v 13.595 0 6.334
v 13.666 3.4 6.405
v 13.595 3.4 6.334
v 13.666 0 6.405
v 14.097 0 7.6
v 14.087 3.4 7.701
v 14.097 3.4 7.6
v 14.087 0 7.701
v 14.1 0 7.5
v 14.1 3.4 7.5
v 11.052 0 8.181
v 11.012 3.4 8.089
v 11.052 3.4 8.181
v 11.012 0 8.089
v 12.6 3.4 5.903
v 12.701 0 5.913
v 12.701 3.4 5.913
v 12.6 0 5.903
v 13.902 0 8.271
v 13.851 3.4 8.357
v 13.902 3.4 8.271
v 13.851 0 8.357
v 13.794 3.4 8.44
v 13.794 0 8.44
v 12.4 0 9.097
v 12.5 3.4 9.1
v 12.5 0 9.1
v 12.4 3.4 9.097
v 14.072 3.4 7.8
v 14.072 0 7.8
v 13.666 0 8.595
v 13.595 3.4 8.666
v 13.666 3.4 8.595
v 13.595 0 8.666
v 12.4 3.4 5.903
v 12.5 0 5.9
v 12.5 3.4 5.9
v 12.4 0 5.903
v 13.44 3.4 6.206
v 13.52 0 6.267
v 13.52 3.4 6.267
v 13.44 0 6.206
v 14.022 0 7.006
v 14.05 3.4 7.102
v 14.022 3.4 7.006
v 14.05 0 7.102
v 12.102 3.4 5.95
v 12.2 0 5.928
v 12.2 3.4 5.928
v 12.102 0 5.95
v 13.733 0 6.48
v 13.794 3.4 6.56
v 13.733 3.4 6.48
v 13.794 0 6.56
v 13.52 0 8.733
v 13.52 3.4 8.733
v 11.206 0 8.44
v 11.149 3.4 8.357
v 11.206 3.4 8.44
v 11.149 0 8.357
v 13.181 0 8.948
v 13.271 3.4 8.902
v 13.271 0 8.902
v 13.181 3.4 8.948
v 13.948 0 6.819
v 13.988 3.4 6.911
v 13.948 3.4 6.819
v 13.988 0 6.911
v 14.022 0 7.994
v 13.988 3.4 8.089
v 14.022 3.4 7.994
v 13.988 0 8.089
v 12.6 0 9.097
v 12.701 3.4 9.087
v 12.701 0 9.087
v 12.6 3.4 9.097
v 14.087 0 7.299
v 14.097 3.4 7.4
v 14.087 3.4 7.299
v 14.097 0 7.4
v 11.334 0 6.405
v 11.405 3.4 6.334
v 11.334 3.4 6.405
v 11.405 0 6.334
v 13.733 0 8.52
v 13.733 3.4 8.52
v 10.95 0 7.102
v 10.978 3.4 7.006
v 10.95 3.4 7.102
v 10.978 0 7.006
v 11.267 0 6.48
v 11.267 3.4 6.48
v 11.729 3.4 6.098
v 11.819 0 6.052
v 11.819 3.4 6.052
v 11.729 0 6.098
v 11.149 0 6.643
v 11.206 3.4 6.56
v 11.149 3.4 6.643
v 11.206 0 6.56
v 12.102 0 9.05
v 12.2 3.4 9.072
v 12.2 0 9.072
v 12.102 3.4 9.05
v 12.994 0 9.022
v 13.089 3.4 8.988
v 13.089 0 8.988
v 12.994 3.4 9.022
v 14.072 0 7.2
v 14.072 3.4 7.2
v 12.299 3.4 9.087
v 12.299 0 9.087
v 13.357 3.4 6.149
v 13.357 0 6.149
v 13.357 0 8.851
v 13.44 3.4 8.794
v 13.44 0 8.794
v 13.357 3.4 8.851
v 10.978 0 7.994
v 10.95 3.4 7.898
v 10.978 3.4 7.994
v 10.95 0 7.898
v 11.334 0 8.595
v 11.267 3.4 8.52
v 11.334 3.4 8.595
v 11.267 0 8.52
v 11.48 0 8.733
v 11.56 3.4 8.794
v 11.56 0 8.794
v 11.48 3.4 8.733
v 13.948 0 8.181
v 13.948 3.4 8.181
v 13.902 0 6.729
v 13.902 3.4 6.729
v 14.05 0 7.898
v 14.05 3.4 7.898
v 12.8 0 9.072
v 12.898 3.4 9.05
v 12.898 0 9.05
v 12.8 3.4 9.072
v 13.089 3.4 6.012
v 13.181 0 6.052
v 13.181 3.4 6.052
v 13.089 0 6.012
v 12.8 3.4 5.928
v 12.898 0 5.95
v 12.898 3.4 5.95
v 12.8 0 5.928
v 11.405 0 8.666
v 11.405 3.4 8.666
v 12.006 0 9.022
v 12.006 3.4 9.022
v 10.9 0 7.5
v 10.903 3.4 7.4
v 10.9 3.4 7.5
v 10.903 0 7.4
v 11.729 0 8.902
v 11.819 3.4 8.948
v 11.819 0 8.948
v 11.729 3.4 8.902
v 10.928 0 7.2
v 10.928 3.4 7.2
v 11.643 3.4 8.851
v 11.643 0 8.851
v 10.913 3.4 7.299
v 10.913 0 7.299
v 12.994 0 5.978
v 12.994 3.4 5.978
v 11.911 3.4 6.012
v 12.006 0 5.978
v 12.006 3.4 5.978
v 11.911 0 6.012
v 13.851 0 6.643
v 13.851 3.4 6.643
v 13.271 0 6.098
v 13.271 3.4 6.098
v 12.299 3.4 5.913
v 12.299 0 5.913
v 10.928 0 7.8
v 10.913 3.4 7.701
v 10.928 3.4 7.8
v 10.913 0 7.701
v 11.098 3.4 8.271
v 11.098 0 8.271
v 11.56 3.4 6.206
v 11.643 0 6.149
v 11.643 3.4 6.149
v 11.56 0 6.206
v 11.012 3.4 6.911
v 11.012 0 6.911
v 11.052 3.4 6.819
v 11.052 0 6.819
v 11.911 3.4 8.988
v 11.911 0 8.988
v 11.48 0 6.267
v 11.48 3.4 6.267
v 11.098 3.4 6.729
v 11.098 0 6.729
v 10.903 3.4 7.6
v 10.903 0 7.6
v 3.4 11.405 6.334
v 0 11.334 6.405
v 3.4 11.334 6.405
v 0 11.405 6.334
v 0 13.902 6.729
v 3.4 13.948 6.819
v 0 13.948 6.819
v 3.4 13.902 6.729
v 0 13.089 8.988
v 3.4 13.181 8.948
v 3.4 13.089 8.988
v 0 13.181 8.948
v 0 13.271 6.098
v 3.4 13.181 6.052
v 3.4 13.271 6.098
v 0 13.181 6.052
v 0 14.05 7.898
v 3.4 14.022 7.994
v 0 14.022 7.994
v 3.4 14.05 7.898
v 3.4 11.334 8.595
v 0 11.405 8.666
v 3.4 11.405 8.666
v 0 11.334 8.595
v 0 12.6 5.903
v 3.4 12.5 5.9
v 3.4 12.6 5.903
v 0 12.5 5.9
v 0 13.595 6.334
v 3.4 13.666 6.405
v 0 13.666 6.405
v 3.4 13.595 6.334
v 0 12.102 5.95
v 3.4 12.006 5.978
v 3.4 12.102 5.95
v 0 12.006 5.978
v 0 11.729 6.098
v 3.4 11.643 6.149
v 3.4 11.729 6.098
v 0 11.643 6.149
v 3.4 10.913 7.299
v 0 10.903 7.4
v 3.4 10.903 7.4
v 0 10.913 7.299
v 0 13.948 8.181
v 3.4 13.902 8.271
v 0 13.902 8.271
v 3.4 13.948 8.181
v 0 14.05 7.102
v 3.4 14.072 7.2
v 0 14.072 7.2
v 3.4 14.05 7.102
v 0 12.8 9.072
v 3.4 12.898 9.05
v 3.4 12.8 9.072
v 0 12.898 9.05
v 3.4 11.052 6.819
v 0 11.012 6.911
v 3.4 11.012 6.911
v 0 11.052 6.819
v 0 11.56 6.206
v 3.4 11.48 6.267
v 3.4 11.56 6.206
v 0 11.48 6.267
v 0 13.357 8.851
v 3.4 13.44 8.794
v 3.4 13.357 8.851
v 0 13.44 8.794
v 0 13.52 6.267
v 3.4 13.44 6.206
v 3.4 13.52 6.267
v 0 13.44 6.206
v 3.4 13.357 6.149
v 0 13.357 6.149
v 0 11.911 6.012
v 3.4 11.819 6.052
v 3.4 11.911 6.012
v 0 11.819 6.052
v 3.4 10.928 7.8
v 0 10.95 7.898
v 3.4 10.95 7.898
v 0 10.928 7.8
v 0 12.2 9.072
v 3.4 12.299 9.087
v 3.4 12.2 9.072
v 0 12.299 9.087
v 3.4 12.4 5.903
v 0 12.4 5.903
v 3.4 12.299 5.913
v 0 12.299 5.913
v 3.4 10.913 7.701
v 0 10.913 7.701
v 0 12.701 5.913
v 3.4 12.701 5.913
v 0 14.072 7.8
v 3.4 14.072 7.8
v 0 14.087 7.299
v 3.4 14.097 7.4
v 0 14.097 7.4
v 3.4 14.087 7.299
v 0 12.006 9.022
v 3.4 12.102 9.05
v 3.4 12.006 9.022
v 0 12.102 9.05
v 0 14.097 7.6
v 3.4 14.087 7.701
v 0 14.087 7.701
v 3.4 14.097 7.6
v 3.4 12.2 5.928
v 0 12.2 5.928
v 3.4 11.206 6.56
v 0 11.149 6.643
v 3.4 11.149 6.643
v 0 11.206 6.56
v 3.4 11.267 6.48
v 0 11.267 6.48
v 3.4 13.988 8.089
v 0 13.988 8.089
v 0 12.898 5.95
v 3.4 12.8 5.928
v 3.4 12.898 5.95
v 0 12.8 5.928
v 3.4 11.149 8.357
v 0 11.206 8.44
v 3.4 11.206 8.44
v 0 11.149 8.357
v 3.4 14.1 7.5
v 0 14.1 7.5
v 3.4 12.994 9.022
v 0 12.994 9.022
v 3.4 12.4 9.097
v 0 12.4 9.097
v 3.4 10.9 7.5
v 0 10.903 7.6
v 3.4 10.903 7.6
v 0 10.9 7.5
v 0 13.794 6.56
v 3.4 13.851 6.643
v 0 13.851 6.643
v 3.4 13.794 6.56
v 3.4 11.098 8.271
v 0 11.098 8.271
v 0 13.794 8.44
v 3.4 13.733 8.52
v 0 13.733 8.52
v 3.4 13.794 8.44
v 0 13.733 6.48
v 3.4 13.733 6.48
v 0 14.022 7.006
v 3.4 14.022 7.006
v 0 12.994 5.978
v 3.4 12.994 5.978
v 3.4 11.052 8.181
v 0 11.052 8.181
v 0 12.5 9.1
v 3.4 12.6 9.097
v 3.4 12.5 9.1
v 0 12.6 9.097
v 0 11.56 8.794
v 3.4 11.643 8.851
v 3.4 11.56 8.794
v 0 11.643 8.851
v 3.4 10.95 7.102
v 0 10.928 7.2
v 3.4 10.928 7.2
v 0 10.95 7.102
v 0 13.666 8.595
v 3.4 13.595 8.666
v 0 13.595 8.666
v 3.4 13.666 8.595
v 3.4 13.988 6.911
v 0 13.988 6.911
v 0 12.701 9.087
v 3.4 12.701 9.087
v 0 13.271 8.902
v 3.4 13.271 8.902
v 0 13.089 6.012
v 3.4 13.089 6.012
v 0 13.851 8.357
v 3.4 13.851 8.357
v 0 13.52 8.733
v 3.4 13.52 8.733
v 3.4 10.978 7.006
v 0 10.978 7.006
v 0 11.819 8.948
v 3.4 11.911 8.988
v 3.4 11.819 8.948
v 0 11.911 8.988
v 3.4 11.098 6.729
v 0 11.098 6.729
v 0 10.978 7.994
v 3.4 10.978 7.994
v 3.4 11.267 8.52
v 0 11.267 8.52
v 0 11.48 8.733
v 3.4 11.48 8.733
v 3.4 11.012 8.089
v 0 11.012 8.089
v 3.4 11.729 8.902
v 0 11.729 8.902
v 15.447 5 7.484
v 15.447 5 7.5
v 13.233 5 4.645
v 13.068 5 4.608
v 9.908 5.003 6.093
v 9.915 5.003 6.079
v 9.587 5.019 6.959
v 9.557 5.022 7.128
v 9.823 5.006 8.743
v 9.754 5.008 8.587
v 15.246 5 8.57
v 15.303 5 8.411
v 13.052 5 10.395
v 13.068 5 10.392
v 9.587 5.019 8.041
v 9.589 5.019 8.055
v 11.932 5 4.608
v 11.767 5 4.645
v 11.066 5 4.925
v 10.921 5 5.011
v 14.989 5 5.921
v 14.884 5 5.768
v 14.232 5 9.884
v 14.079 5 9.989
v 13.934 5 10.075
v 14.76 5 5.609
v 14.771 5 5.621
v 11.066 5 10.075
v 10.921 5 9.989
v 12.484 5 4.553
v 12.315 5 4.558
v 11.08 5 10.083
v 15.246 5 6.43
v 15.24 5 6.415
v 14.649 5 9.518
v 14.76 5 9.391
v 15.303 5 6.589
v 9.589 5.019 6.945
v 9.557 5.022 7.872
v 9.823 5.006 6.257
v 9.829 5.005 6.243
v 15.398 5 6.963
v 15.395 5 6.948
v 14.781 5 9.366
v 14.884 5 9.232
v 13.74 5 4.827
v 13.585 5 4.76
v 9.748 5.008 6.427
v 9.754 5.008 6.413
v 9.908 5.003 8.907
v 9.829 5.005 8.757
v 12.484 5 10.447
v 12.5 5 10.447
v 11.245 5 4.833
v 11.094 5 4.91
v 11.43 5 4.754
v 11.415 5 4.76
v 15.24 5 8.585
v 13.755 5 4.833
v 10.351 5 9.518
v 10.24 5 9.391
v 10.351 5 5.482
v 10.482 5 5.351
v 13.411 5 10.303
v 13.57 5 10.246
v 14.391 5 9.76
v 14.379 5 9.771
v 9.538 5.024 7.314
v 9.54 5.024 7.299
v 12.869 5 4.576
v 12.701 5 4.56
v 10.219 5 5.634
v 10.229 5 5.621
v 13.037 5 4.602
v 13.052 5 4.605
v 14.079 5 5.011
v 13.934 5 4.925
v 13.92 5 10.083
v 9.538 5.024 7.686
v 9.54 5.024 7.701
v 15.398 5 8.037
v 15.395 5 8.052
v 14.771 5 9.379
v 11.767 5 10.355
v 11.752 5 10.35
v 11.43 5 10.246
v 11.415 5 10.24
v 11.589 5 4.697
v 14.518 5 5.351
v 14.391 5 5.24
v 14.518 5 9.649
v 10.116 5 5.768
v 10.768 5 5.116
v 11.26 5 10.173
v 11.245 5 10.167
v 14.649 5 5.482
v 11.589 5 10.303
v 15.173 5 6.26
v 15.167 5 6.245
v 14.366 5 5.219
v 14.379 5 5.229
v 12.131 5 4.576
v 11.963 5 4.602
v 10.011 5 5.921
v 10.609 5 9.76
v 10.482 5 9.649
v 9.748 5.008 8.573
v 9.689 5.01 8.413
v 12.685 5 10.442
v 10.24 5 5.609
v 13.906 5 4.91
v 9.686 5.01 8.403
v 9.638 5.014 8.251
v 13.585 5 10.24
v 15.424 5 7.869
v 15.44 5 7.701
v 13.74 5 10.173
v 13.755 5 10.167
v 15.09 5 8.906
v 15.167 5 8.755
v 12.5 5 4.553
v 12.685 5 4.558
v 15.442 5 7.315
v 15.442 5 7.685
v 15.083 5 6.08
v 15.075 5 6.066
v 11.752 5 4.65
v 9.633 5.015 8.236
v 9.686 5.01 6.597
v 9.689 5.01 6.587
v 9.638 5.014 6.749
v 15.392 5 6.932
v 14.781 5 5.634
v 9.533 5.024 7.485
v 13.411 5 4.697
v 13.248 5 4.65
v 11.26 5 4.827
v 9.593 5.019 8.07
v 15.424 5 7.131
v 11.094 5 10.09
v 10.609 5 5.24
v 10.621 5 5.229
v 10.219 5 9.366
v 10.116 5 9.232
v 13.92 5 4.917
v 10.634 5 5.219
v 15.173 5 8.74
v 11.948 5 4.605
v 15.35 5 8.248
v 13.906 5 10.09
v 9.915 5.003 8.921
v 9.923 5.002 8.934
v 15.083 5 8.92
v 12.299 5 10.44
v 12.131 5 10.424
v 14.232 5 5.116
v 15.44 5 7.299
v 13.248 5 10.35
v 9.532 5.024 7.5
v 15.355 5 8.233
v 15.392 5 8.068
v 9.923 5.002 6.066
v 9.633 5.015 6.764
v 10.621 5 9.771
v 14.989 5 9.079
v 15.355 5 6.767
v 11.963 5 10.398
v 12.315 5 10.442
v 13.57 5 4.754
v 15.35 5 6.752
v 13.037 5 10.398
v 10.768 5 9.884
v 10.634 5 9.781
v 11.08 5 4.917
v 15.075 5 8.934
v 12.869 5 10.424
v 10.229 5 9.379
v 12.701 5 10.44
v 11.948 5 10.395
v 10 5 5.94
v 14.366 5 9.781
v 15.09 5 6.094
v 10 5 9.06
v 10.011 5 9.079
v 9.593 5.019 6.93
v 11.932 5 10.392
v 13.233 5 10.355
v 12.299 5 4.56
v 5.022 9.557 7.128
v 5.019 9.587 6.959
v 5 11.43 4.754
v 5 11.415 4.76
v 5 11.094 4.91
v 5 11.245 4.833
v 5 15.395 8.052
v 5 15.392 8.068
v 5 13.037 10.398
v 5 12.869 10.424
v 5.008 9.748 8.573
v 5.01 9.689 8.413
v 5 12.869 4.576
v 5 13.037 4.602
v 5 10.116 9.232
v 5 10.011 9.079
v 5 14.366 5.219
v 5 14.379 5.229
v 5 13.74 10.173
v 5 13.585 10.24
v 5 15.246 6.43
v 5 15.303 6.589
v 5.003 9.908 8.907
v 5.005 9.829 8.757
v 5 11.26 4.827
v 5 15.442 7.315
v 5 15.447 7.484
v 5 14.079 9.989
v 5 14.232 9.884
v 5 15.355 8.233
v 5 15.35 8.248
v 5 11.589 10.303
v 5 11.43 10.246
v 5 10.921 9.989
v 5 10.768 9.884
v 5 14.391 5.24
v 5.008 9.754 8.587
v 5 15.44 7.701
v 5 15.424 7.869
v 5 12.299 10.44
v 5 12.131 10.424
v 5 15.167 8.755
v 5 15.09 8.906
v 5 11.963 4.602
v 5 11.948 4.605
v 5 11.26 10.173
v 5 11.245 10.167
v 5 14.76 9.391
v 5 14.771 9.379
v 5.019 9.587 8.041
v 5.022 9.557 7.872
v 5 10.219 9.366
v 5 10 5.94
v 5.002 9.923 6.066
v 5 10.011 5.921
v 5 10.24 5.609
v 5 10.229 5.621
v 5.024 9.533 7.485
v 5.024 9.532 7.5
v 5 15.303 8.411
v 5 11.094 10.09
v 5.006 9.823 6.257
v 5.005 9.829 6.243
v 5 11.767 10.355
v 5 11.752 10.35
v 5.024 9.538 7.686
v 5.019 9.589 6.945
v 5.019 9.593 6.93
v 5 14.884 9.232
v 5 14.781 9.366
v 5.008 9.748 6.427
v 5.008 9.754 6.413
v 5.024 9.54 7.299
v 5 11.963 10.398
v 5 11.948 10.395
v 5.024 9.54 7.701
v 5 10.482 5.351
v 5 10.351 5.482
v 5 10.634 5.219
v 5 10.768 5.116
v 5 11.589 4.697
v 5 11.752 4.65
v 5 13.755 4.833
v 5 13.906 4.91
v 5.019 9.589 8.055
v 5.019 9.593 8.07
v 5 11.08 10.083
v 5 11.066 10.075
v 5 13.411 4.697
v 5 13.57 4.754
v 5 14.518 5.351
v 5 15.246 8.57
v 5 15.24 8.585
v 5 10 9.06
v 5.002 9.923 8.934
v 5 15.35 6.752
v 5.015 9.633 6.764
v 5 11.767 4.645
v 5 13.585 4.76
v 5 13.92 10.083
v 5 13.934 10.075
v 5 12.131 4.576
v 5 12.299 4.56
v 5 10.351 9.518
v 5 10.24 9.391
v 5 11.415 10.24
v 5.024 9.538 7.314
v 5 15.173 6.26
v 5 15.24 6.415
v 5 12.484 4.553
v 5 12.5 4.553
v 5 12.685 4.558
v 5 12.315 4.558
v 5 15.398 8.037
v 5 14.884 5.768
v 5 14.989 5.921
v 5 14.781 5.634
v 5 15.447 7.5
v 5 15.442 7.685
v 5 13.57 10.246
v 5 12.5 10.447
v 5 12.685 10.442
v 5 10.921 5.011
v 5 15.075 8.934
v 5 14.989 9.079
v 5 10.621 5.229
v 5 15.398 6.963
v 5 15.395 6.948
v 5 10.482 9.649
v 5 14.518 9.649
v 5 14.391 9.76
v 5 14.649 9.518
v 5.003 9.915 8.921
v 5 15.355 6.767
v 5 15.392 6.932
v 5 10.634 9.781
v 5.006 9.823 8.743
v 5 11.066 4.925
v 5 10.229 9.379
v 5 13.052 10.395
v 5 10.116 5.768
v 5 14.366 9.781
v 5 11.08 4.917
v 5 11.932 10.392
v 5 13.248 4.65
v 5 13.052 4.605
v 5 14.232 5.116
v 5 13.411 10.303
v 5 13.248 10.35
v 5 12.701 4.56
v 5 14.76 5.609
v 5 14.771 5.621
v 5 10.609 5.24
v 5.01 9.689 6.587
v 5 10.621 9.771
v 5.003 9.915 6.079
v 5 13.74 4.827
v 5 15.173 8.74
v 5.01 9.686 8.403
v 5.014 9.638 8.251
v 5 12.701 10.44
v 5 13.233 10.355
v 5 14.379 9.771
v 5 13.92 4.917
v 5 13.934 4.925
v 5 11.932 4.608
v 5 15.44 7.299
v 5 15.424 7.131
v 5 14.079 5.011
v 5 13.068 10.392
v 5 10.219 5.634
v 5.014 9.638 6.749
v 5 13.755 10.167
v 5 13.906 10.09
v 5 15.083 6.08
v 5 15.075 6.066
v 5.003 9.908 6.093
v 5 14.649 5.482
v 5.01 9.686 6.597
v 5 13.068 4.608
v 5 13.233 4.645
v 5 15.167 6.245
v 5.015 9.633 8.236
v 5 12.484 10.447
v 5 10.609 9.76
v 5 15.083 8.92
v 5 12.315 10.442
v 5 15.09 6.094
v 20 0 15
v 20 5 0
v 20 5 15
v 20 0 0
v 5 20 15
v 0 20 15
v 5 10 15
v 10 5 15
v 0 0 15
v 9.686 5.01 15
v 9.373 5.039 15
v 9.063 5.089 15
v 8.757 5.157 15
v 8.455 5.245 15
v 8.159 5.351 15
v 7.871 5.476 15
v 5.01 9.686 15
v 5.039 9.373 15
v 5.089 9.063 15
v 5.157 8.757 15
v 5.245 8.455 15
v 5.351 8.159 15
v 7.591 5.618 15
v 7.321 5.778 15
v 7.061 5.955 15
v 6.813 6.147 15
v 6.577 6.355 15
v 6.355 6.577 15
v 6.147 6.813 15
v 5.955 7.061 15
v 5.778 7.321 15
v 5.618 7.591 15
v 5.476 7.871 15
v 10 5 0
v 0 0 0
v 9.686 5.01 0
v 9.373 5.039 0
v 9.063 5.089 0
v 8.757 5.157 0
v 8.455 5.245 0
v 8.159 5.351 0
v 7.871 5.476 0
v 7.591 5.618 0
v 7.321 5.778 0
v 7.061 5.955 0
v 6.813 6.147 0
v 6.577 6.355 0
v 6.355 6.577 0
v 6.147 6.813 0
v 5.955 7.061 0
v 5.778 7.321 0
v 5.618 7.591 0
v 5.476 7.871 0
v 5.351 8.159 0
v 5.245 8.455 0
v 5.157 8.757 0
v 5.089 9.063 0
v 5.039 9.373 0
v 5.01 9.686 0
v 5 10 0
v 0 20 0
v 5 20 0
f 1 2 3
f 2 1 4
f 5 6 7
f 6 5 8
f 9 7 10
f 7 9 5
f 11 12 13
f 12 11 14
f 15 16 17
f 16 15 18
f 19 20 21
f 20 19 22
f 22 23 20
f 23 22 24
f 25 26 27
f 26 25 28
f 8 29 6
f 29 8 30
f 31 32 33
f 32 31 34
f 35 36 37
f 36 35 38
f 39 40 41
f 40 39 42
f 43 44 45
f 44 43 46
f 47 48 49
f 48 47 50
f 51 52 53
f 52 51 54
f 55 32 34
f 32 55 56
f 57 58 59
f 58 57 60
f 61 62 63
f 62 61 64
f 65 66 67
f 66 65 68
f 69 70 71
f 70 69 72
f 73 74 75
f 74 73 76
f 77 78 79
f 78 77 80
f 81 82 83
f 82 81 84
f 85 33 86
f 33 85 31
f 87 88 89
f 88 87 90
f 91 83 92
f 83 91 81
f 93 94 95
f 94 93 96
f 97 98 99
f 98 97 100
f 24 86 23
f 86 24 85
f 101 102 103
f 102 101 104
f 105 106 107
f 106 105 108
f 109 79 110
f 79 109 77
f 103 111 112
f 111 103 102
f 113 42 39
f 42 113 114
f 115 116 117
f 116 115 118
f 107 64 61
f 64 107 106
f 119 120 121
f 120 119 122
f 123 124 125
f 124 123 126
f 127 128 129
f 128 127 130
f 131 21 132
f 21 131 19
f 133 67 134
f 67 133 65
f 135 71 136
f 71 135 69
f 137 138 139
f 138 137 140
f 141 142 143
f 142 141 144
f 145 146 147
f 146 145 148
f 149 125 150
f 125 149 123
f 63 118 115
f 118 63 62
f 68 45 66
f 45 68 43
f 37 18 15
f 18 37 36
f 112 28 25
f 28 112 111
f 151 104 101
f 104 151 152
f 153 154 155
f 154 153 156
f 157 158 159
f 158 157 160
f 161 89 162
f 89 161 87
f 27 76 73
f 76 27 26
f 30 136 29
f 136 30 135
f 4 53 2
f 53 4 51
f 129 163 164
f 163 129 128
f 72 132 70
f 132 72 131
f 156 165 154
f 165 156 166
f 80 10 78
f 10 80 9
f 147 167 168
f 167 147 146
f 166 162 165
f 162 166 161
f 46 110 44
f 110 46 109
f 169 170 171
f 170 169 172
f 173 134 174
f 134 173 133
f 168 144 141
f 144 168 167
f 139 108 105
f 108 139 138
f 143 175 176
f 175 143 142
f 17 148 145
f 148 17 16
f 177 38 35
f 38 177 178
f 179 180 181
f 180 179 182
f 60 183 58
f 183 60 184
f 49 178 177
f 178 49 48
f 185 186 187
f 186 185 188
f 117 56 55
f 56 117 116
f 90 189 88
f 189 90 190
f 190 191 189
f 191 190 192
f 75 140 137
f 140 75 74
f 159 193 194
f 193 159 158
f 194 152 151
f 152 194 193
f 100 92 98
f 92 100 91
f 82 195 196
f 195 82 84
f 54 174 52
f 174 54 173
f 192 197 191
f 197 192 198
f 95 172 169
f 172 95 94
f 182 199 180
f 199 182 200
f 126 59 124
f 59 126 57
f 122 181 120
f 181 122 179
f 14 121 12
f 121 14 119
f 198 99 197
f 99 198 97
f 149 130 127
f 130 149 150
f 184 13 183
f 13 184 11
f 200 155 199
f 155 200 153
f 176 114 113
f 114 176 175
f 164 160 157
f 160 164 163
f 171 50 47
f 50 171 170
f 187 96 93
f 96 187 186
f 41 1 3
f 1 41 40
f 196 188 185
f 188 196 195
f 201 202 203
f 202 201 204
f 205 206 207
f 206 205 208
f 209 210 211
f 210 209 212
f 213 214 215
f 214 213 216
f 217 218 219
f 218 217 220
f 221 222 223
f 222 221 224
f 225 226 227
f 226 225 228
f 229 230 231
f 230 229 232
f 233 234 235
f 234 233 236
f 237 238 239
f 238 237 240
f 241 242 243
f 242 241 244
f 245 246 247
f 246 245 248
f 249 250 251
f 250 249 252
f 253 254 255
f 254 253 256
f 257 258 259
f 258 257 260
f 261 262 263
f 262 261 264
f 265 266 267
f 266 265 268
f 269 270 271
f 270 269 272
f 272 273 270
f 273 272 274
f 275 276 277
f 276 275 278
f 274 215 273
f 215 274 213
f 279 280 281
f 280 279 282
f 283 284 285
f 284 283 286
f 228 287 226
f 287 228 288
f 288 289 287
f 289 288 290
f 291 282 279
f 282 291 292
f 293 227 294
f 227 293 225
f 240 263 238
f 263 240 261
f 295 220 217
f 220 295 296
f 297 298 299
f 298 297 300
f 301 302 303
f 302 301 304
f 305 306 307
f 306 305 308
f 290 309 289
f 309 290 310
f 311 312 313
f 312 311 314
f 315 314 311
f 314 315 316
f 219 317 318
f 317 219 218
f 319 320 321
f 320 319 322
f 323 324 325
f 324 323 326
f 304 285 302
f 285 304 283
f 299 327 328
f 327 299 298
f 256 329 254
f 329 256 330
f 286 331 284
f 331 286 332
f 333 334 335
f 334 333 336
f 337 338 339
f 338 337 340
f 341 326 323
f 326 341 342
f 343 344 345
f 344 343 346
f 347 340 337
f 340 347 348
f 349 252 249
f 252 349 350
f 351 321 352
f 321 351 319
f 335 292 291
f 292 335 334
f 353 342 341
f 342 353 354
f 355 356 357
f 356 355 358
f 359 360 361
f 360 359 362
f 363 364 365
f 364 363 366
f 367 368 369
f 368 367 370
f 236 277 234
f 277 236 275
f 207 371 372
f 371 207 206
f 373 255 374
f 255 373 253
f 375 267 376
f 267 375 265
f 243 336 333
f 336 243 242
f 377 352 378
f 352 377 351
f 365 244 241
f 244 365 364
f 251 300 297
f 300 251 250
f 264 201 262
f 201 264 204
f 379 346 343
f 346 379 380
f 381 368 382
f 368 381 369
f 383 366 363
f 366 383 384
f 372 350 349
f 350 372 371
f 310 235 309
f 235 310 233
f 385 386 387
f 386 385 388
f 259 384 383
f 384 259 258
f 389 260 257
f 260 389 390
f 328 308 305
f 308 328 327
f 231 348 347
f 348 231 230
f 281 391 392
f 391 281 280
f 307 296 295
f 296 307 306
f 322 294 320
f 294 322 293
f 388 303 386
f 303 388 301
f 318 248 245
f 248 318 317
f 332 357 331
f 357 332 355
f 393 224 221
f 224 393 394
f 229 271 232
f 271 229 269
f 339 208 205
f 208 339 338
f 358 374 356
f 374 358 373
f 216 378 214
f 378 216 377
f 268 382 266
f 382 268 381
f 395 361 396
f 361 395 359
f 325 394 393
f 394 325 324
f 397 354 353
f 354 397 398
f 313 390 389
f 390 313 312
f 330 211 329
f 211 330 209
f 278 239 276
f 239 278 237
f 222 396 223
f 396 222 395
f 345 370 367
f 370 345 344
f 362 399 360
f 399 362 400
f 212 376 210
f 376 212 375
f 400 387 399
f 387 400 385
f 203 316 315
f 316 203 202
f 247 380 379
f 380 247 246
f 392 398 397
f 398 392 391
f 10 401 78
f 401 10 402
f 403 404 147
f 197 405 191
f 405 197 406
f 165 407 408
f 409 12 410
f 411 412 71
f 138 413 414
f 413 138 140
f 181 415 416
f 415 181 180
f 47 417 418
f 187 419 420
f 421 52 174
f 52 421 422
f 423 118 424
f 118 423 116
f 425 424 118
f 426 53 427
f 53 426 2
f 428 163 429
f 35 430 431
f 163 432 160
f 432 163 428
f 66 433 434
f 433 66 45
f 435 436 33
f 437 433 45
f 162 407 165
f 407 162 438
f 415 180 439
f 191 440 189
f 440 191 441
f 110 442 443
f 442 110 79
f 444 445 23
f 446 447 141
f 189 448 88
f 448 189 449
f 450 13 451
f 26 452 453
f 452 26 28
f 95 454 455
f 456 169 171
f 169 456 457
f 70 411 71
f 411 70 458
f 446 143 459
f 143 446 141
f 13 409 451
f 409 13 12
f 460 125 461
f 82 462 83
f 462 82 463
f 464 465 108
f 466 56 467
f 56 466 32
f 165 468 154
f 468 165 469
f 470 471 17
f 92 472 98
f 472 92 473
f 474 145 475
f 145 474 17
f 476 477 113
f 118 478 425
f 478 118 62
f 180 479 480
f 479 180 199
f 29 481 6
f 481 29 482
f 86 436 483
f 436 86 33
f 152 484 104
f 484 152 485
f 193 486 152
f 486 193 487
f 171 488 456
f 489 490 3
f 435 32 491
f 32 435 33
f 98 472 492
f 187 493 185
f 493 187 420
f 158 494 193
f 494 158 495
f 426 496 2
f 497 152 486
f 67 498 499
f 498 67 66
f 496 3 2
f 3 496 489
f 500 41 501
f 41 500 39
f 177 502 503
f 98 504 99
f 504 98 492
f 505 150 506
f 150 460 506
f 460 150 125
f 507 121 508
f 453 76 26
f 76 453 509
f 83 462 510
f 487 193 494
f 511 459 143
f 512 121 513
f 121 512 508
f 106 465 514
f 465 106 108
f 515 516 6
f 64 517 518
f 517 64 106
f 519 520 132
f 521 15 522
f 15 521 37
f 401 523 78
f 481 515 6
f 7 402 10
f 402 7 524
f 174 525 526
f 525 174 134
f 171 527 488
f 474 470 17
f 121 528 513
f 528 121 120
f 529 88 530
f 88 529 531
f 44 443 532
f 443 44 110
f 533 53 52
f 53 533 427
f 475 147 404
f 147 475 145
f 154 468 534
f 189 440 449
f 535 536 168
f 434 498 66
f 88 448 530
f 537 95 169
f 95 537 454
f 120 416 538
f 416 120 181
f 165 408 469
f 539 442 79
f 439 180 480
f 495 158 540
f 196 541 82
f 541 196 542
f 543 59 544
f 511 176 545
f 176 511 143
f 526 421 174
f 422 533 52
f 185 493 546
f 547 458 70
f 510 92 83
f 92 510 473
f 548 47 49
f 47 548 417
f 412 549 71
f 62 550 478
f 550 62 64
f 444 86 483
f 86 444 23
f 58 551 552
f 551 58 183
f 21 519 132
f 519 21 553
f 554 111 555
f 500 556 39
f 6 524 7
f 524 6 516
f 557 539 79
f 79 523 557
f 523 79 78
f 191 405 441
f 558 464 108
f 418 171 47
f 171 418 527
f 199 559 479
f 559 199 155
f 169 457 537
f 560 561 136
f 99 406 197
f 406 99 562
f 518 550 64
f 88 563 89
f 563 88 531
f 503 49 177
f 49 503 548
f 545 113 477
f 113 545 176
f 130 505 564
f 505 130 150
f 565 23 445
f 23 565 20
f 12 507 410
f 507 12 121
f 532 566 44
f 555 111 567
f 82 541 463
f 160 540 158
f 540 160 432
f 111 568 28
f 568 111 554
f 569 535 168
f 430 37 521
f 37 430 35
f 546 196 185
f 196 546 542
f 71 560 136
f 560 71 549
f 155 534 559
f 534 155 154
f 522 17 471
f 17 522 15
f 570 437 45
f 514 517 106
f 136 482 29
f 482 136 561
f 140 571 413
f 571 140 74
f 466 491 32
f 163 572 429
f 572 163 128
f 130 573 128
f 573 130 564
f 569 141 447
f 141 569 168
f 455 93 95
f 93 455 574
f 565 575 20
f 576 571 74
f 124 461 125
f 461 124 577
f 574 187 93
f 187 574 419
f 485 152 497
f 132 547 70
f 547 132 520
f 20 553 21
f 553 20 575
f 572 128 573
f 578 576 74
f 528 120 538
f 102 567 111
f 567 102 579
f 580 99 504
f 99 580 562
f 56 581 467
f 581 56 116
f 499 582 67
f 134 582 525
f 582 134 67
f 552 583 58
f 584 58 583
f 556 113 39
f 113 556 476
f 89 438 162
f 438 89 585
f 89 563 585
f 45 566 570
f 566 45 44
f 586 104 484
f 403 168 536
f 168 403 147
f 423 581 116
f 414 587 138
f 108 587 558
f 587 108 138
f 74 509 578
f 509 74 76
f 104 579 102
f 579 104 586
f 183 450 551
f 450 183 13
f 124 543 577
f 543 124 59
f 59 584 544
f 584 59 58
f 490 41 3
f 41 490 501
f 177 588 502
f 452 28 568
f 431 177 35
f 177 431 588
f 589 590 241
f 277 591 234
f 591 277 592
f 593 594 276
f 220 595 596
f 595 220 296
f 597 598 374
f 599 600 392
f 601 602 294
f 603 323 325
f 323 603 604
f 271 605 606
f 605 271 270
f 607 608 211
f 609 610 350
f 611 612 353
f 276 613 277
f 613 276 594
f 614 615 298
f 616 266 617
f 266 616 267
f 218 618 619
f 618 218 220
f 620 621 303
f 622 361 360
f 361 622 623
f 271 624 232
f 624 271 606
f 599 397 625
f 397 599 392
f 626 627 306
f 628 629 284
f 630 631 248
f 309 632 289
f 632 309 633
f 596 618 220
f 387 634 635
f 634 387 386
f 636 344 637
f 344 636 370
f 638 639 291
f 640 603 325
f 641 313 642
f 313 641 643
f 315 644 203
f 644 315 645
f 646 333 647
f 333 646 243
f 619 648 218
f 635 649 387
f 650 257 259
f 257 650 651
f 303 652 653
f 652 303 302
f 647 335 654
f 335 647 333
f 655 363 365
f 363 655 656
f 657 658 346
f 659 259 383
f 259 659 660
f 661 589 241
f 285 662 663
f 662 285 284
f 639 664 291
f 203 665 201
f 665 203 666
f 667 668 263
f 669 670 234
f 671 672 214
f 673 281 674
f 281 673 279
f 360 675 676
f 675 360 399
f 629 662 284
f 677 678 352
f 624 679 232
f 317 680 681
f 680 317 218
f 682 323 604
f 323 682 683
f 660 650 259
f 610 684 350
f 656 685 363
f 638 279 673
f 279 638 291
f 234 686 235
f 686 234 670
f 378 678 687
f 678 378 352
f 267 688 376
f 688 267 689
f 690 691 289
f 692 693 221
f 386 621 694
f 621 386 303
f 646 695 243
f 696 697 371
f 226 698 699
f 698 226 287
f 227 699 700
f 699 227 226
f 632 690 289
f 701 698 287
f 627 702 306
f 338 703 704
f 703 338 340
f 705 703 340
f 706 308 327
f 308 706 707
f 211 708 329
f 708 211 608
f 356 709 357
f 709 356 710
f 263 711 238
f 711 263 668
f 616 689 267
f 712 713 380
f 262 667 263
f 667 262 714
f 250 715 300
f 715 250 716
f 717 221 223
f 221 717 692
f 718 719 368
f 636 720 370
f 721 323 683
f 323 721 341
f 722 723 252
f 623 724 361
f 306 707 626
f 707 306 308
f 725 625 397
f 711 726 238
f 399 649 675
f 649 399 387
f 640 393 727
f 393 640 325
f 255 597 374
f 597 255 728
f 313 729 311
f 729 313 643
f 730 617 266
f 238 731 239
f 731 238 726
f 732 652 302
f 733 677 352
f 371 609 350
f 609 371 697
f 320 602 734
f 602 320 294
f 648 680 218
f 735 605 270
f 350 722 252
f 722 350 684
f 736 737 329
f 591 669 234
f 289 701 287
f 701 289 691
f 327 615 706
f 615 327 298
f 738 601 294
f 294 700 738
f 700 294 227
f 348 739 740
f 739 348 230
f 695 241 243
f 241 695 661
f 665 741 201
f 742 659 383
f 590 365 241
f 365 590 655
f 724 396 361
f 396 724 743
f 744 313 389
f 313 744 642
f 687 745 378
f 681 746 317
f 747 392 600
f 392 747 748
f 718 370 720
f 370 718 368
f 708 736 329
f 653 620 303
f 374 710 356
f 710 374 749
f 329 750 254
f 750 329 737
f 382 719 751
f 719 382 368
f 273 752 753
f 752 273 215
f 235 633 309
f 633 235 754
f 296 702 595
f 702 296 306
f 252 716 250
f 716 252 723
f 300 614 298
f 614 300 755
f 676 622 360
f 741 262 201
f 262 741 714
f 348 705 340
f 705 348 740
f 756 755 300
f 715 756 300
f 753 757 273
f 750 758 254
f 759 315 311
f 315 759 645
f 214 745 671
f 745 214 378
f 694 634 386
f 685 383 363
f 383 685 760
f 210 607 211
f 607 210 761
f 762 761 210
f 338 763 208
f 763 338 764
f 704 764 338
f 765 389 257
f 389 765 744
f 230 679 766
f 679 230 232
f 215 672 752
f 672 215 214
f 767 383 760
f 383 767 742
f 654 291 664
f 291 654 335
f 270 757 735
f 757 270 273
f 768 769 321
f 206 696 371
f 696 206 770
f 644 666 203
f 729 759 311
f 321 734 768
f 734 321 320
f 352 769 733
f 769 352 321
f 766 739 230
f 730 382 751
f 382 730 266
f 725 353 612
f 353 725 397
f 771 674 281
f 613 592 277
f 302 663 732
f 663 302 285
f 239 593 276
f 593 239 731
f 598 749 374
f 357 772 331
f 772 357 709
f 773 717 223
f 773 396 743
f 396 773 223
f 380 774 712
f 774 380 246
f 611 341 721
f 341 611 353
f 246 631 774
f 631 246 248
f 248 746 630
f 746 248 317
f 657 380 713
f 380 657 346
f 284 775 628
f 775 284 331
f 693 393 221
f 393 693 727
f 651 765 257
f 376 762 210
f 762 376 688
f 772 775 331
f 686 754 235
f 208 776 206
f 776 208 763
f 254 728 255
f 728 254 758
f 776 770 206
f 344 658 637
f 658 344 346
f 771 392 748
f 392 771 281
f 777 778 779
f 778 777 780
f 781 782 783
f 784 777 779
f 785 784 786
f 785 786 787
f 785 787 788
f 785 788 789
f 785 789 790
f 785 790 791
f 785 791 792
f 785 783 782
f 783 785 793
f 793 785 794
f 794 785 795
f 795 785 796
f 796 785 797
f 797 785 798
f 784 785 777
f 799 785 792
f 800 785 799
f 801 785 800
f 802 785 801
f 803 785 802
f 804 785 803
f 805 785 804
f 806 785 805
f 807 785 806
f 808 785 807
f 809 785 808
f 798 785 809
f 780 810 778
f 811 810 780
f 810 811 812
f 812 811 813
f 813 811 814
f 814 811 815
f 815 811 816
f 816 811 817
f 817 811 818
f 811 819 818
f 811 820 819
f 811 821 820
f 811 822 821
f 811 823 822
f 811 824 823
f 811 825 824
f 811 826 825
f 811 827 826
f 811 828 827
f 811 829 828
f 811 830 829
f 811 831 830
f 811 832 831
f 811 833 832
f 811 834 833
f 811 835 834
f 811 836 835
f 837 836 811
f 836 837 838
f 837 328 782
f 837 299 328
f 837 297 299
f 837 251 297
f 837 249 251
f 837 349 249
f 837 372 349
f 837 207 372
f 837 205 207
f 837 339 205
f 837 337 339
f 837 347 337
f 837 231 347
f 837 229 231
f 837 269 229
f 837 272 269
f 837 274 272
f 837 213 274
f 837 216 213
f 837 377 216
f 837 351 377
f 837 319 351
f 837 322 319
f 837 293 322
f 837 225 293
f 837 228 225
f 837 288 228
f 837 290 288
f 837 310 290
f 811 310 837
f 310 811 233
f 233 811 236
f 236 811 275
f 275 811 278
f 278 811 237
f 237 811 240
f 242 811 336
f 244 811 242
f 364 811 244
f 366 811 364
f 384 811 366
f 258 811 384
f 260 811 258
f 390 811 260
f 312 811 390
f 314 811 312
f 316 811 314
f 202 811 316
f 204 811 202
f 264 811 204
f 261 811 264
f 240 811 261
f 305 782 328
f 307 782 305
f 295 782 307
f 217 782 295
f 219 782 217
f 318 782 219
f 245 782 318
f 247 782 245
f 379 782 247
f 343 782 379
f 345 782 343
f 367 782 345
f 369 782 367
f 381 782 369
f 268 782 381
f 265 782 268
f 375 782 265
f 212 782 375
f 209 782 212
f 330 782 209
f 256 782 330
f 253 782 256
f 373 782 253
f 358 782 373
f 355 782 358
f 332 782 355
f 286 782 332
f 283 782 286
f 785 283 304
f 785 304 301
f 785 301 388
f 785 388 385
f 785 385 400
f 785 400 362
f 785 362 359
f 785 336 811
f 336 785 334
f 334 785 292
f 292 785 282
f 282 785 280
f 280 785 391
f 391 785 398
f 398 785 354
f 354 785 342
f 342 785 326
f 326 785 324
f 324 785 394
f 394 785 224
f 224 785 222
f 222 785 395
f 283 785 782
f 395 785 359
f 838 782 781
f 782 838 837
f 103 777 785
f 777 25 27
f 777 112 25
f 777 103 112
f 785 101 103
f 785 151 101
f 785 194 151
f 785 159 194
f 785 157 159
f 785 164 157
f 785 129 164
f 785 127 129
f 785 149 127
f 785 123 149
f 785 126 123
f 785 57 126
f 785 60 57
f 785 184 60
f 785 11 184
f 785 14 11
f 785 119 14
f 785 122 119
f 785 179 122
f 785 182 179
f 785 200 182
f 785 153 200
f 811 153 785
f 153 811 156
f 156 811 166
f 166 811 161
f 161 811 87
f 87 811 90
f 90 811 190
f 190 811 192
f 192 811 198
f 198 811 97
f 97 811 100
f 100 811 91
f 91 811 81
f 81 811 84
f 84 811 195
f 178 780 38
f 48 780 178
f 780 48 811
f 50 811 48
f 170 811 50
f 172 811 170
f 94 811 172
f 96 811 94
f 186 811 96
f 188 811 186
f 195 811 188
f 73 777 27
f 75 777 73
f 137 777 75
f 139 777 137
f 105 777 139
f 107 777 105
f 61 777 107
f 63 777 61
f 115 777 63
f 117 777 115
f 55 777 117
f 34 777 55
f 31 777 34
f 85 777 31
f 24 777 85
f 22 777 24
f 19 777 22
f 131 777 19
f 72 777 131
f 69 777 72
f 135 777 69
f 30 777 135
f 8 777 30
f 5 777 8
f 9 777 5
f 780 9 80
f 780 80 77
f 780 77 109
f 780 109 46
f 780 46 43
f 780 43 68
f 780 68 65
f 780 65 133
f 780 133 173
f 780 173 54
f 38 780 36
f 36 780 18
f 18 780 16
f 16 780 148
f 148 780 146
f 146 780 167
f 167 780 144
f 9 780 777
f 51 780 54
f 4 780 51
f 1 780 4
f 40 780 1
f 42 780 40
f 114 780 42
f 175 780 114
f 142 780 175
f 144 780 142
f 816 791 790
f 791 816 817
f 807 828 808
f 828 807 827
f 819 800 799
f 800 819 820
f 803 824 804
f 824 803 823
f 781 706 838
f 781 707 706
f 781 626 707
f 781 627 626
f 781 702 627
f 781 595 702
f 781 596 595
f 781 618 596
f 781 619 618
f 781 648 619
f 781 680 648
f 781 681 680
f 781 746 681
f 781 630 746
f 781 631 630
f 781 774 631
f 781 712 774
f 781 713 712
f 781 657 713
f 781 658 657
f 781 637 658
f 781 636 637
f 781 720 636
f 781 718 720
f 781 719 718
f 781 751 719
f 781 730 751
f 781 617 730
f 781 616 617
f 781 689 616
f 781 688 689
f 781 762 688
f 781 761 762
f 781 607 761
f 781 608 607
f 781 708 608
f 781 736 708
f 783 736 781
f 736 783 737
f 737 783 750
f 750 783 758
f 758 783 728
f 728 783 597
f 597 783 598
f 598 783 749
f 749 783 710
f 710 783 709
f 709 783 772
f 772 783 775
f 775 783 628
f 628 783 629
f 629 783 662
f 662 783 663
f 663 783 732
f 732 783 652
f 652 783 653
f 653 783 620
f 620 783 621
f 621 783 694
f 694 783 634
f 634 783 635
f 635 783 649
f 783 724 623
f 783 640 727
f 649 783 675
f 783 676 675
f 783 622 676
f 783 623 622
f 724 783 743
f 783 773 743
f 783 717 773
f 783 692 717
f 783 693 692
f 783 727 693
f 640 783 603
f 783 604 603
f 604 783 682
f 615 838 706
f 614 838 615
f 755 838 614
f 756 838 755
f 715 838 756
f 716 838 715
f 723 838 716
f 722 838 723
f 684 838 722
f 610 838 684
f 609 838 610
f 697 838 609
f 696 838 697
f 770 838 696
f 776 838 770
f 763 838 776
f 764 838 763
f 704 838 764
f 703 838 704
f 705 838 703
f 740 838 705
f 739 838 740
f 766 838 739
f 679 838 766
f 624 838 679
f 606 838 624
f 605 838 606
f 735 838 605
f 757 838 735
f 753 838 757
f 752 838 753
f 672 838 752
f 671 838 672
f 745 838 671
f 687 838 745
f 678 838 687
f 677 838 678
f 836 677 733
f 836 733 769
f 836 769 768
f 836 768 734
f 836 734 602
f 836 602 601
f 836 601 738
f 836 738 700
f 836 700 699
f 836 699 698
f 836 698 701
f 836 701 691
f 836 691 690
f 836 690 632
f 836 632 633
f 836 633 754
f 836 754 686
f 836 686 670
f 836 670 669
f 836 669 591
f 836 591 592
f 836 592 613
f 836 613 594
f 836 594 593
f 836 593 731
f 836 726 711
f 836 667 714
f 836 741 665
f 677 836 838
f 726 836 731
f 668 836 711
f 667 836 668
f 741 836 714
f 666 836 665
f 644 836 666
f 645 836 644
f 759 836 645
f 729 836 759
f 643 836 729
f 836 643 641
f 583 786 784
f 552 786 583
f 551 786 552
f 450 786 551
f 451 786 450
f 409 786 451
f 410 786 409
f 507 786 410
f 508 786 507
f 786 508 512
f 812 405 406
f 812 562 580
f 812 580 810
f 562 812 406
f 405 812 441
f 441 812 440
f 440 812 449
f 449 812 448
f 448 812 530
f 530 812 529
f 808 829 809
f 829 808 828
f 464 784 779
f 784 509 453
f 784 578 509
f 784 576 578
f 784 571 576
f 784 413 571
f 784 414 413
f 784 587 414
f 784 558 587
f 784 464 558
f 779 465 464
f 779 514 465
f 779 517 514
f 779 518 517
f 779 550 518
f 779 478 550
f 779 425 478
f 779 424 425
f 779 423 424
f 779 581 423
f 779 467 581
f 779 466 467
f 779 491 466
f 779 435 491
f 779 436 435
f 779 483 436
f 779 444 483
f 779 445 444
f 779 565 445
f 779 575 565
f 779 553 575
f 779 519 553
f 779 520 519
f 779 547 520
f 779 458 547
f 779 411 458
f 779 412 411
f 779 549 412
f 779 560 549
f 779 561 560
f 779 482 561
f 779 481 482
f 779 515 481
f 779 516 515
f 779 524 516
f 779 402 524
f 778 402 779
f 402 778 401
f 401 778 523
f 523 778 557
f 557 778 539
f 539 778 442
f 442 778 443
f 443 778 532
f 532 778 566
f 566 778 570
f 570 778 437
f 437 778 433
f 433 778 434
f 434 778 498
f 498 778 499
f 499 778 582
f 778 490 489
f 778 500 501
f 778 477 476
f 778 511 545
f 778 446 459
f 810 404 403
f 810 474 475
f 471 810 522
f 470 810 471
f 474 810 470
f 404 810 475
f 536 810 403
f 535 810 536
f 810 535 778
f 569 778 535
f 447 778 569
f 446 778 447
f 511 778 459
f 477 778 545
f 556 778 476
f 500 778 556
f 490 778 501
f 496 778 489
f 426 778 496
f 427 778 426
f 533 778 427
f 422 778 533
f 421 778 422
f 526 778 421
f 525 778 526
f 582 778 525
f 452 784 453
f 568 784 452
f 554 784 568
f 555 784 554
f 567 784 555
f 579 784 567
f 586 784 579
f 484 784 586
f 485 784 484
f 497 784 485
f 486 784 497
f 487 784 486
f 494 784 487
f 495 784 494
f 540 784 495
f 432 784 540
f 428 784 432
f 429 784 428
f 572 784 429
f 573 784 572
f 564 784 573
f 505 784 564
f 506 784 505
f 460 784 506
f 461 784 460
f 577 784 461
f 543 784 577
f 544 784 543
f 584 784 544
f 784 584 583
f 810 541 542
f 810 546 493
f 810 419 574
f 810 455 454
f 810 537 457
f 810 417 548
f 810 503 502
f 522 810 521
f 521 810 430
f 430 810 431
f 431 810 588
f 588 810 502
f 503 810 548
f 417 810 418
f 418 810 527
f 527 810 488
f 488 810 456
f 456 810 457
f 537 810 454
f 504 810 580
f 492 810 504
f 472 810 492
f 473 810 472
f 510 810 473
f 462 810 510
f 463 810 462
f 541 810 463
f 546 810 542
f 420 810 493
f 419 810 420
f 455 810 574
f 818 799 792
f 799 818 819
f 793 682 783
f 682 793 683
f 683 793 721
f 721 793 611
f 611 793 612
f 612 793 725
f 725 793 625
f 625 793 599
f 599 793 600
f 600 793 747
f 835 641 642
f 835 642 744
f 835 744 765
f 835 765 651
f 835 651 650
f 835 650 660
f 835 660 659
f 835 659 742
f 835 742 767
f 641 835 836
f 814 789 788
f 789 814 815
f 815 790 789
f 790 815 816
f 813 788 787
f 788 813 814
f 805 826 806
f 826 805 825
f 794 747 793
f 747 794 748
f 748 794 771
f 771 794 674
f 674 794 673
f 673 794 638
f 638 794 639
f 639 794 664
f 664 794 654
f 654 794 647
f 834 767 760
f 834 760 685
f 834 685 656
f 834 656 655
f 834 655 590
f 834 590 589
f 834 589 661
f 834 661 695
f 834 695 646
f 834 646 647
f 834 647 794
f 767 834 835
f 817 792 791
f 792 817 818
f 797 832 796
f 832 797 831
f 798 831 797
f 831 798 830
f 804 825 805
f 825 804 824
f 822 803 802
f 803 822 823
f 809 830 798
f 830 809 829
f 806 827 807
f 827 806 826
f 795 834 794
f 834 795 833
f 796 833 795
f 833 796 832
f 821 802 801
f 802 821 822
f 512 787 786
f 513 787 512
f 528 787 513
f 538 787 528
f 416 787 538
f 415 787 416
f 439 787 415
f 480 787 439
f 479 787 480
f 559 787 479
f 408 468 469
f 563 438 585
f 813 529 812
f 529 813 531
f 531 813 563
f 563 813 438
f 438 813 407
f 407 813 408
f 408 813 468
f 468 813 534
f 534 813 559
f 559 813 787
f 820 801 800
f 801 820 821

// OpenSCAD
Width=15;
Length=20;
HoleDiameter=3.2;
Thickness=5;

$fn=100;

a=Width;
b=Length;
r=HoleDiameter/2;
d=Thickness;


color([.4,.5,.7,1])
intersection () {
difference () {
    cube(size=[b,b,a]);

    translate([2*d,2*d,-a/2]) 
    minkowski() {
        cube(size=[2*b,2*b,a]);
        cylinder(r=d,h=a); 
    }

union() {
    translate ([b-a/2,2*d,a/2]) rotate([90,0,0]) cylinder(r=r,h=3*d);
    translate ([-d,b-a/2,a/2]) rotate([0,90,0]) cylinder(r=r,h=3*d);
    translate([b-a/2,0,a/2]) rotate([-90,0,0]) translate([0,0,d-r]) cylinder(r1=r,r2=2*r,h=r+.3);
    translate([0,b-a/2,a/2]) rotate([0,90,0]) translate([0,0,d-r]) cylinder(r1=r,r2=2*r,h=r+.3);
}
}
/*
    union() {
    translate([0,-1,a/2]) rotate([-90,0,0]) cylinder(r=a/2,h=b+2);
    translate([-1,0,a/2]) rotate([0,90,0]) cylinder(r=a/2,h=b+2);
//    translate([0,0,a/2]) sphere(a/2+d);
    }
*/
}
